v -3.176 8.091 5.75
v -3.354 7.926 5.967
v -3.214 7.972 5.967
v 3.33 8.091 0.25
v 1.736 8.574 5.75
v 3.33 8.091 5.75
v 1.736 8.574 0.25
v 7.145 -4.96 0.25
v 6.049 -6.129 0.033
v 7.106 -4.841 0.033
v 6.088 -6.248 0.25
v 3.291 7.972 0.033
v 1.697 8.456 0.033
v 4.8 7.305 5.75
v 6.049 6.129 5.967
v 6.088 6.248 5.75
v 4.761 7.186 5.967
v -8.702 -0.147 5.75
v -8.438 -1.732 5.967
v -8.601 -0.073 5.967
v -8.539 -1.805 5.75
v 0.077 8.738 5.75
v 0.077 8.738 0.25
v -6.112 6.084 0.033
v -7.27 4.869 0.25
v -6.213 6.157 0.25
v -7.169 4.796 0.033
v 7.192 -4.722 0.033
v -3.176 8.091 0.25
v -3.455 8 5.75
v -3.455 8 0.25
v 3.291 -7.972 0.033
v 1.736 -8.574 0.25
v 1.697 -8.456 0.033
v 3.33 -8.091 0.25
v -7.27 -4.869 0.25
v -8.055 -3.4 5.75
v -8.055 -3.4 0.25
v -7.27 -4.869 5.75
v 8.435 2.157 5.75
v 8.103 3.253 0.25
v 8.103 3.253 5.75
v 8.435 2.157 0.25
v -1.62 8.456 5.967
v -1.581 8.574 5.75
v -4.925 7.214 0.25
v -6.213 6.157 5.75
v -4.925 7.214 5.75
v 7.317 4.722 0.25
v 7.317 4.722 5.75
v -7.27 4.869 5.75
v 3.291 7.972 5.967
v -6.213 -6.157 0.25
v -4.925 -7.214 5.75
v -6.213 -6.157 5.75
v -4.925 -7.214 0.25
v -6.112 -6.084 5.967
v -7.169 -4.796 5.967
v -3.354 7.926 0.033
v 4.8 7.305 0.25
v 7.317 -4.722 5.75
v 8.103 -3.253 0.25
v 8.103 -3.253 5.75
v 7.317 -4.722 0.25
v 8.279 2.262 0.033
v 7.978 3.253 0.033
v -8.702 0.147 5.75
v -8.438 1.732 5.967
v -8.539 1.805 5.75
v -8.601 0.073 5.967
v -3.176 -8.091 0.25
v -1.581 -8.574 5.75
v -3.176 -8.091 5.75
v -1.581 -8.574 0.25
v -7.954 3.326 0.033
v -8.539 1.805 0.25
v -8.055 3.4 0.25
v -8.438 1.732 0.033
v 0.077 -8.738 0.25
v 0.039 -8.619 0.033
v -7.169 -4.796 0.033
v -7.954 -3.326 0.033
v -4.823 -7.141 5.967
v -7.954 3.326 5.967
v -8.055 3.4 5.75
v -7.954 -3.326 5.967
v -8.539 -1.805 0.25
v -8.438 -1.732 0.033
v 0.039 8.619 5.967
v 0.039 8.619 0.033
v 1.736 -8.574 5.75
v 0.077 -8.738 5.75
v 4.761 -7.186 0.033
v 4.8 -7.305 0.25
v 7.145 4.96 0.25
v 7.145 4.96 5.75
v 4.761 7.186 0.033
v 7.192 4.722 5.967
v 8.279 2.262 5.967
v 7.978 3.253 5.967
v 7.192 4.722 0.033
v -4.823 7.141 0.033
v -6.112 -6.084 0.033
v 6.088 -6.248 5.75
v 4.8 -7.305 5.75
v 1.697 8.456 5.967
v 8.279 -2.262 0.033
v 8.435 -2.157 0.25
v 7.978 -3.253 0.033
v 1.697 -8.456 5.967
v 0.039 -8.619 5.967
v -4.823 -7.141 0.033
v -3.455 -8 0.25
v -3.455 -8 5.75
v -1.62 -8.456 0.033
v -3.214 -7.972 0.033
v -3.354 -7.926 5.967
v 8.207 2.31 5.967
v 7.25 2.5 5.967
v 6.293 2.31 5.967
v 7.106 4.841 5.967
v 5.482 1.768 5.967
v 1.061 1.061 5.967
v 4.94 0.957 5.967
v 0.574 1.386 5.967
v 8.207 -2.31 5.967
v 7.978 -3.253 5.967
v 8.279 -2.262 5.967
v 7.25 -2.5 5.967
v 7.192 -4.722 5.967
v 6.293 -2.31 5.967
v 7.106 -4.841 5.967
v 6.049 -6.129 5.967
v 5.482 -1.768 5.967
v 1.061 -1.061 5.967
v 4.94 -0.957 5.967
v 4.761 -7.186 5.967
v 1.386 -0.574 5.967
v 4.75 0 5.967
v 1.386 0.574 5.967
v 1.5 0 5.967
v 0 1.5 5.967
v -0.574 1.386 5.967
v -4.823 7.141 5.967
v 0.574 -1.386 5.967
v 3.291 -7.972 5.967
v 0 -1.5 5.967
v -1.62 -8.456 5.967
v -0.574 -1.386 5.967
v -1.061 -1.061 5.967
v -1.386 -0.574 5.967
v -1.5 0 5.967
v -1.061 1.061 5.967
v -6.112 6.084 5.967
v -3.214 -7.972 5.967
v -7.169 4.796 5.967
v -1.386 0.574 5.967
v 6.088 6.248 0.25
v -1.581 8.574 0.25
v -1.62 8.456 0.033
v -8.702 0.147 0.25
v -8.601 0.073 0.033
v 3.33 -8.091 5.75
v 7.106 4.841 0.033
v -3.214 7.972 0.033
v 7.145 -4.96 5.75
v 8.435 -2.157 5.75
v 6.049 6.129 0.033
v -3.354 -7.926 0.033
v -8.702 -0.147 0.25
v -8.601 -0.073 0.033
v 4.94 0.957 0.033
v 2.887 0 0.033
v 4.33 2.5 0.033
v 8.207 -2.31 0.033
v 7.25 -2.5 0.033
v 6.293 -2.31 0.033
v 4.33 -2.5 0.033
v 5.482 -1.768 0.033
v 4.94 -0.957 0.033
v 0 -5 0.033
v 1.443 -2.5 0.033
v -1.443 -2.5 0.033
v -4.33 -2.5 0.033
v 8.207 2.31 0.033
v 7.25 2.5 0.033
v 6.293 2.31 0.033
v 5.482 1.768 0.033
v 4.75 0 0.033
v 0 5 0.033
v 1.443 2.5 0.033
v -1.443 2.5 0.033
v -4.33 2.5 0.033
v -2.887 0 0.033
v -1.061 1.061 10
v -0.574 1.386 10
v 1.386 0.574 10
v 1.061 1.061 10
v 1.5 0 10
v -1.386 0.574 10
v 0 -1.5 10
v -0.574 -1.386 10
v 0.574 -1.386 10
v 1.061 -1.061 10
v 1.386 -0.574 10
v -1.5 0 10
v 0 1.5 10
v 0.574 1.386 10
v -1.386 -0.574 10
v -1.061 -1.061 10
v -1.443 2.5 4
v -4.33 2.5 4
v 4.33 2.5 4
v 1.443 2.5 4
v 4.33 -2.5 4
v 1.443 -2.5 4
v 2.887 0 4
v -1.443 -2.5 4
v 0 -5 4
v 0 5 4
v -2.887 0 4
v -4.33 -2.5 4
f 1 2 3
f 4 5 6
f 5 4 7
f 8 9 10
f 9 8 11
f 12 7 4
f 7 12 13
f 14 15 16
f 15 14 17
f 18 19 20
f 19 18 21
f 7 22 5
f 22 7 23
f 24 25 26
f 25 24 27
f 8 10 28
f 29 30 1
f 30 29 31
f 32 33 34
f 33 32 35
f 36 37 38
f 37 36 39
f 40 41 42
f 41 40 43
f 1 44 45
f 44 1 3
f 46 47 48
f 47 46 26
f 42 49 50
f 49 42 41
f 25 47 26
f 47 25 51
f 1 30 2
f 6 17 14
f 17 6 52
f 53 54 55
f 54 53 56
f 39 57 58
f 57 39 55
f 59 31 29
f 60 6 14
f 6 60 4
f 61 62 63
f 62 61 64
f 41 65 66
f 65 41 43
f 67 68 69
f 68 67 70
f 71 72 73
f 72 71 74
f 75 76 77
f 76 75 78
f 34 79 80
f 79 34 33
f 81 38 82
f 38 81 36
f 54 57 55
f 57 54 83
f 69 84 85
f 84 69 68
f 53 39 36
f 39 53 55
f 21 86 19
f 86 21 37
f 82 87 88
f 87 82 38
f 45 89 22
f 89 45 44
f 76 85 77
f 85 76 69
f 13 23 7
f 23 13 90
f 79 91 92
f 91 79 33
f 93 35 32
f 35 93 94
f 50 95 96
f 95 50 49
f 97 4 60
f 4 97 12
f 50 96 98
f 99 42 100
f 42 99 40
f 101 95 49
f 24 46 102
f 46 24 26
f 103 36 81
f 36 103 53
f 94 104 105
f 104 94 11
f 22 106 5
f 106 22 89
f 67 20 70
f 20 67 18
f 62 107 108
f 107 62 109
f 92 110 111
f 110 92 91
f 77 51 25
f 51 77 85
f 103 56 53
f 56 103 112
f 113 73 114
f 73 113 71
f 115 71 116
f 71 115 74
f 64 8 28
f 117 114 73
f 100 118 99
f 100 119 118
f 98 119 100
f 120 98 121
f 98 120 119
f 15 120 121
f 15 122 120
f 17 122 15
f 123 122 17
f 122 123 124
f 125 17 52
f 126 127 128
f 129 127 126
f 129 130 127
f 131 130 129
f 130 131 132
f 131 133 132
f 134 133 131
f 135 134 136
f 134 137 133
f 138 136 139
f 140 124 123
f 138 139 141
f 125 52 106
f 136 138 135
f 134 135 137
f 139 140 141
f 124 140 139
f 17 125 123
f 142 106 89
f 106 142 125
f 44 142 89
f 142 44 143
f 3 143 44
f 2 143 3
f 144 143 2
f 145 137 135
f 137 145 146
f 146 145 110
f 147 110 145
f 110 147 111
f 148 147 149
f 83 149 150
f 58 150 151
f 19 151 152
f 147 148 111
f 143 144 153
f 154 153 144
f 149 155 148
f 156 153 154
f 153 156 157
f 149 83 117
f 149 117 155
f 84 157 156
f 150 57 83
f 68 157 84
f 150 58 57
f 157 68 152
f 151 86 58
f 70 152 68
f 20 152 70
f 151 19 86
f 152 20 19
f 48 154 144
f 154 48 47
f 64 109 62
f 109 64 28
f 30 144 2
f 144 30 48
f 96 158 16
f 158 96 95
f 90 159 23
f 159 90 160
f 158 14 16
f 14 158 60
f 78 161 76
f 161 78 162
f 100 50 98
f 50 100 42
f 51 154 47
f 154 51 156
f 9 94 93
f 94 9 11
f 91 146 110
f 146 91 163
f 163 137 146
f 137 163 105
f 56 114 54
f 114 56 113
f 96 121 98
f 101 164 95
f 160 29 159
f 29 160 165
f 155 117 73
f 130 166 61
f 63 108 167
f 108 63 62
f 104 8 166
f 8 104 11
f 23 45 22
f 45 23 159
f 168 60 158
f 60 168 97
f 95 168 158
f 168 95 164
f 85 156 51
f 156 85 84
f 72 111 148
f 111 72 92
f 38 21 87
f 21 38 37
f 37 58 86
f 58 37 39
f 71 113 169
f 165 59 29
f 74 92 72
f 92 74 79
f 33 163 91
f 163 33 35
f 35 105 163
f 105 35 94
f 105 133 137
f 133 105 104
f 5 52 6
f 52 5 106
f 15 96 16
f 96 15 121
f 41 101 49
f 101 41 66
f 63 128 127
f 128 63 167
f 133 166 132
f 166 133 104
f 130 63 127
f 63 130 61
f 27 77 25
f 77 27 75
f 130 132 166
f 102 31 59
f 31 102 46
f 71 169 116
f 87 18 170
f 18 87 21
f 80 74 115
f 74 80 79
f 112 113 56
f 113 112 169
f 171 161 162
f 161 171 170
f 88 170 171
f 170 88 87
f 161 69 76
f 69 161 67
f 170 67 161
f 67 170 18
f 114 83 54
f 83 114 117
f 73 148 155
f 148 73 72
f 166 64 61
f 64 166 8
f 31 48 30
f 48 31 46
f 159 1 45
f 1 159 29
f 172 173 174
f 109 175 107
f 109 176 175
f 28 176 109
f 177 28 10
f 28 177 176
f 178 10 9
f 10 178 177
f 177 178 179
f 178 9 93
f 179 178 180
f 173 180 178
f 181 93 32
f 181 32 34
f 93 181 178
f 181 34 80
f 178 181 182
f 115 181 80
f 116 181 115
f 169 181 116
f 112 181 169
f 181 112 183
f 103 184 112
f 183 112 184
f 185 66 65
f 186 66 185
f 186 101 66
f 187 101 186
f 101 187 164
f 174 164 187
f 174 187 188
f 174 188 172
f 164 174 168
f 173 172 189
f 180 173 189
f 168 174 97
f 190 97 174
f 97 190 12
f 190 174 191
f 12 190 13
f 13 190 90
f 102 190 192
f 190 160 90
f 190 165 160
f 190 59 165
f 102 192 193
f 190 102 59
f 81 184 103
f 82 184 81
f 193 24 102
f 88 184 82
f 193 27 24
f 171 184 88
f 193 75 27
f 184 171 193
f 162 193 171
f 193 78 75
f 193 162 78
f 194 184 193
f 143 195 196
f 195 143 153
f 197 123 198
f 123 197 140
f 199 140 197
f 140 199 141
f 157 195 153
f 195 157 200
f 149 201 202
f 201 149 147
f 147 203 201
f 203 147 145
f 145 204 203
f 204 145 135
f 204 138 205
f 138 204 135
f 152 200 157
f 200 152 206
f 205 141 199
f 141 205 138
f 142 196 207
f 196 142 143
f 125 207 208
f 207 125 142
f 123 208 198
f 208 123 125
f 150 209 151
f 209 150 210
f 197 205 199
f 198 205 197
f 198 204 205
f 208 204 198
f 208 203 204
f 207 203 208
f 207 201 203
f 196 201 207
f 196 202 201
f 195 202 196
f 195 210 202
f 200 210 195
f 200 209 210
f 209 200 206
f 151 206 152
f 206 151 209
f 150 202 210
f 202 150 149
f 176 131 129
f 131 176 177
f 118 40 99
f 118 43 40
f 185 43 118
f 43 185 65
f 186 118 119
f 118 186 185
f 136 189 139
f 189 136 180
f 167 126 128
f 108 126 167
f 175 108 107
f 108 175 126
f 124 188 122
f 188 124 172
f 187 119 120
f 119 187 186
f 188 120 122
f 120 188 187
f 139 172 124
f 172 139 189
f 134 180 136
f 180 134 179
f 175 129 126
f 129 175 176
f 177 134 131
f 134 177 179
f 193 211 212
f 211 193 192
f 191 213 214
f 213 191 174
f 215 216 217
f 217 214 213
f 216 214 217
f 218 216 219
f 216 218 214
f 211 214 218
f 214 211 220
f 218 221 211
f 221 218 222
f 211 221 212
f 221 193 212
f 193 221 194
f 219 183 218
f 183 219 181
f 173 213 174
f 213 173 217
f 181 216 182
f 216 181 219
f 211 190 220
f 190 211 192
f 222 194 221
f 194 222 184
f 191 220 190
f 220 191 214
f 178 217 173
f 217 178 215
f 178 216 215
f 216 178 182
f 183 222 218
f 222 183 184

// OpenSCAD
// diameter of the inner hole
inner = 3;
// depth of the inner hole
h_in = 4;
// diameter of the outer hole
outer = 17.5;
// depth of the outer hole
h_out = 6;
// rounding of the outer hole
rounding = 0.25;

// inset of the current handle
inset = 1.5;
// diameter of the current handle
pin = 5.0;
// length of the current handle
plen = 10;

// diameter of the center plug
plug = 10;
// depth of the center plug
h_plug = 4;
// sides of the center plug x 2
sides = 3;

difference() {
  union() {
    translate([0,0,rounding])
    minkowski() {
      cylinder(r=outer/2-rounding, h=h_out-rounding*2, $fn=32);
      sphere(rounding);
    }
    cylinder(r=inner/2, h=h_out+h_in, $fn=16);
  }
  translate([outer/2-inset, 0, 0])
    cylinder(r=pin/2, h=plen, $fn=16);
  rotate([0,0,30])
    cylinder(r=plug/2, h=h_plug, $fn=sides);
  rotate([0,0,-30])
  cylinder(r=plug/2, h=h_plug, $fn=sides);
}
